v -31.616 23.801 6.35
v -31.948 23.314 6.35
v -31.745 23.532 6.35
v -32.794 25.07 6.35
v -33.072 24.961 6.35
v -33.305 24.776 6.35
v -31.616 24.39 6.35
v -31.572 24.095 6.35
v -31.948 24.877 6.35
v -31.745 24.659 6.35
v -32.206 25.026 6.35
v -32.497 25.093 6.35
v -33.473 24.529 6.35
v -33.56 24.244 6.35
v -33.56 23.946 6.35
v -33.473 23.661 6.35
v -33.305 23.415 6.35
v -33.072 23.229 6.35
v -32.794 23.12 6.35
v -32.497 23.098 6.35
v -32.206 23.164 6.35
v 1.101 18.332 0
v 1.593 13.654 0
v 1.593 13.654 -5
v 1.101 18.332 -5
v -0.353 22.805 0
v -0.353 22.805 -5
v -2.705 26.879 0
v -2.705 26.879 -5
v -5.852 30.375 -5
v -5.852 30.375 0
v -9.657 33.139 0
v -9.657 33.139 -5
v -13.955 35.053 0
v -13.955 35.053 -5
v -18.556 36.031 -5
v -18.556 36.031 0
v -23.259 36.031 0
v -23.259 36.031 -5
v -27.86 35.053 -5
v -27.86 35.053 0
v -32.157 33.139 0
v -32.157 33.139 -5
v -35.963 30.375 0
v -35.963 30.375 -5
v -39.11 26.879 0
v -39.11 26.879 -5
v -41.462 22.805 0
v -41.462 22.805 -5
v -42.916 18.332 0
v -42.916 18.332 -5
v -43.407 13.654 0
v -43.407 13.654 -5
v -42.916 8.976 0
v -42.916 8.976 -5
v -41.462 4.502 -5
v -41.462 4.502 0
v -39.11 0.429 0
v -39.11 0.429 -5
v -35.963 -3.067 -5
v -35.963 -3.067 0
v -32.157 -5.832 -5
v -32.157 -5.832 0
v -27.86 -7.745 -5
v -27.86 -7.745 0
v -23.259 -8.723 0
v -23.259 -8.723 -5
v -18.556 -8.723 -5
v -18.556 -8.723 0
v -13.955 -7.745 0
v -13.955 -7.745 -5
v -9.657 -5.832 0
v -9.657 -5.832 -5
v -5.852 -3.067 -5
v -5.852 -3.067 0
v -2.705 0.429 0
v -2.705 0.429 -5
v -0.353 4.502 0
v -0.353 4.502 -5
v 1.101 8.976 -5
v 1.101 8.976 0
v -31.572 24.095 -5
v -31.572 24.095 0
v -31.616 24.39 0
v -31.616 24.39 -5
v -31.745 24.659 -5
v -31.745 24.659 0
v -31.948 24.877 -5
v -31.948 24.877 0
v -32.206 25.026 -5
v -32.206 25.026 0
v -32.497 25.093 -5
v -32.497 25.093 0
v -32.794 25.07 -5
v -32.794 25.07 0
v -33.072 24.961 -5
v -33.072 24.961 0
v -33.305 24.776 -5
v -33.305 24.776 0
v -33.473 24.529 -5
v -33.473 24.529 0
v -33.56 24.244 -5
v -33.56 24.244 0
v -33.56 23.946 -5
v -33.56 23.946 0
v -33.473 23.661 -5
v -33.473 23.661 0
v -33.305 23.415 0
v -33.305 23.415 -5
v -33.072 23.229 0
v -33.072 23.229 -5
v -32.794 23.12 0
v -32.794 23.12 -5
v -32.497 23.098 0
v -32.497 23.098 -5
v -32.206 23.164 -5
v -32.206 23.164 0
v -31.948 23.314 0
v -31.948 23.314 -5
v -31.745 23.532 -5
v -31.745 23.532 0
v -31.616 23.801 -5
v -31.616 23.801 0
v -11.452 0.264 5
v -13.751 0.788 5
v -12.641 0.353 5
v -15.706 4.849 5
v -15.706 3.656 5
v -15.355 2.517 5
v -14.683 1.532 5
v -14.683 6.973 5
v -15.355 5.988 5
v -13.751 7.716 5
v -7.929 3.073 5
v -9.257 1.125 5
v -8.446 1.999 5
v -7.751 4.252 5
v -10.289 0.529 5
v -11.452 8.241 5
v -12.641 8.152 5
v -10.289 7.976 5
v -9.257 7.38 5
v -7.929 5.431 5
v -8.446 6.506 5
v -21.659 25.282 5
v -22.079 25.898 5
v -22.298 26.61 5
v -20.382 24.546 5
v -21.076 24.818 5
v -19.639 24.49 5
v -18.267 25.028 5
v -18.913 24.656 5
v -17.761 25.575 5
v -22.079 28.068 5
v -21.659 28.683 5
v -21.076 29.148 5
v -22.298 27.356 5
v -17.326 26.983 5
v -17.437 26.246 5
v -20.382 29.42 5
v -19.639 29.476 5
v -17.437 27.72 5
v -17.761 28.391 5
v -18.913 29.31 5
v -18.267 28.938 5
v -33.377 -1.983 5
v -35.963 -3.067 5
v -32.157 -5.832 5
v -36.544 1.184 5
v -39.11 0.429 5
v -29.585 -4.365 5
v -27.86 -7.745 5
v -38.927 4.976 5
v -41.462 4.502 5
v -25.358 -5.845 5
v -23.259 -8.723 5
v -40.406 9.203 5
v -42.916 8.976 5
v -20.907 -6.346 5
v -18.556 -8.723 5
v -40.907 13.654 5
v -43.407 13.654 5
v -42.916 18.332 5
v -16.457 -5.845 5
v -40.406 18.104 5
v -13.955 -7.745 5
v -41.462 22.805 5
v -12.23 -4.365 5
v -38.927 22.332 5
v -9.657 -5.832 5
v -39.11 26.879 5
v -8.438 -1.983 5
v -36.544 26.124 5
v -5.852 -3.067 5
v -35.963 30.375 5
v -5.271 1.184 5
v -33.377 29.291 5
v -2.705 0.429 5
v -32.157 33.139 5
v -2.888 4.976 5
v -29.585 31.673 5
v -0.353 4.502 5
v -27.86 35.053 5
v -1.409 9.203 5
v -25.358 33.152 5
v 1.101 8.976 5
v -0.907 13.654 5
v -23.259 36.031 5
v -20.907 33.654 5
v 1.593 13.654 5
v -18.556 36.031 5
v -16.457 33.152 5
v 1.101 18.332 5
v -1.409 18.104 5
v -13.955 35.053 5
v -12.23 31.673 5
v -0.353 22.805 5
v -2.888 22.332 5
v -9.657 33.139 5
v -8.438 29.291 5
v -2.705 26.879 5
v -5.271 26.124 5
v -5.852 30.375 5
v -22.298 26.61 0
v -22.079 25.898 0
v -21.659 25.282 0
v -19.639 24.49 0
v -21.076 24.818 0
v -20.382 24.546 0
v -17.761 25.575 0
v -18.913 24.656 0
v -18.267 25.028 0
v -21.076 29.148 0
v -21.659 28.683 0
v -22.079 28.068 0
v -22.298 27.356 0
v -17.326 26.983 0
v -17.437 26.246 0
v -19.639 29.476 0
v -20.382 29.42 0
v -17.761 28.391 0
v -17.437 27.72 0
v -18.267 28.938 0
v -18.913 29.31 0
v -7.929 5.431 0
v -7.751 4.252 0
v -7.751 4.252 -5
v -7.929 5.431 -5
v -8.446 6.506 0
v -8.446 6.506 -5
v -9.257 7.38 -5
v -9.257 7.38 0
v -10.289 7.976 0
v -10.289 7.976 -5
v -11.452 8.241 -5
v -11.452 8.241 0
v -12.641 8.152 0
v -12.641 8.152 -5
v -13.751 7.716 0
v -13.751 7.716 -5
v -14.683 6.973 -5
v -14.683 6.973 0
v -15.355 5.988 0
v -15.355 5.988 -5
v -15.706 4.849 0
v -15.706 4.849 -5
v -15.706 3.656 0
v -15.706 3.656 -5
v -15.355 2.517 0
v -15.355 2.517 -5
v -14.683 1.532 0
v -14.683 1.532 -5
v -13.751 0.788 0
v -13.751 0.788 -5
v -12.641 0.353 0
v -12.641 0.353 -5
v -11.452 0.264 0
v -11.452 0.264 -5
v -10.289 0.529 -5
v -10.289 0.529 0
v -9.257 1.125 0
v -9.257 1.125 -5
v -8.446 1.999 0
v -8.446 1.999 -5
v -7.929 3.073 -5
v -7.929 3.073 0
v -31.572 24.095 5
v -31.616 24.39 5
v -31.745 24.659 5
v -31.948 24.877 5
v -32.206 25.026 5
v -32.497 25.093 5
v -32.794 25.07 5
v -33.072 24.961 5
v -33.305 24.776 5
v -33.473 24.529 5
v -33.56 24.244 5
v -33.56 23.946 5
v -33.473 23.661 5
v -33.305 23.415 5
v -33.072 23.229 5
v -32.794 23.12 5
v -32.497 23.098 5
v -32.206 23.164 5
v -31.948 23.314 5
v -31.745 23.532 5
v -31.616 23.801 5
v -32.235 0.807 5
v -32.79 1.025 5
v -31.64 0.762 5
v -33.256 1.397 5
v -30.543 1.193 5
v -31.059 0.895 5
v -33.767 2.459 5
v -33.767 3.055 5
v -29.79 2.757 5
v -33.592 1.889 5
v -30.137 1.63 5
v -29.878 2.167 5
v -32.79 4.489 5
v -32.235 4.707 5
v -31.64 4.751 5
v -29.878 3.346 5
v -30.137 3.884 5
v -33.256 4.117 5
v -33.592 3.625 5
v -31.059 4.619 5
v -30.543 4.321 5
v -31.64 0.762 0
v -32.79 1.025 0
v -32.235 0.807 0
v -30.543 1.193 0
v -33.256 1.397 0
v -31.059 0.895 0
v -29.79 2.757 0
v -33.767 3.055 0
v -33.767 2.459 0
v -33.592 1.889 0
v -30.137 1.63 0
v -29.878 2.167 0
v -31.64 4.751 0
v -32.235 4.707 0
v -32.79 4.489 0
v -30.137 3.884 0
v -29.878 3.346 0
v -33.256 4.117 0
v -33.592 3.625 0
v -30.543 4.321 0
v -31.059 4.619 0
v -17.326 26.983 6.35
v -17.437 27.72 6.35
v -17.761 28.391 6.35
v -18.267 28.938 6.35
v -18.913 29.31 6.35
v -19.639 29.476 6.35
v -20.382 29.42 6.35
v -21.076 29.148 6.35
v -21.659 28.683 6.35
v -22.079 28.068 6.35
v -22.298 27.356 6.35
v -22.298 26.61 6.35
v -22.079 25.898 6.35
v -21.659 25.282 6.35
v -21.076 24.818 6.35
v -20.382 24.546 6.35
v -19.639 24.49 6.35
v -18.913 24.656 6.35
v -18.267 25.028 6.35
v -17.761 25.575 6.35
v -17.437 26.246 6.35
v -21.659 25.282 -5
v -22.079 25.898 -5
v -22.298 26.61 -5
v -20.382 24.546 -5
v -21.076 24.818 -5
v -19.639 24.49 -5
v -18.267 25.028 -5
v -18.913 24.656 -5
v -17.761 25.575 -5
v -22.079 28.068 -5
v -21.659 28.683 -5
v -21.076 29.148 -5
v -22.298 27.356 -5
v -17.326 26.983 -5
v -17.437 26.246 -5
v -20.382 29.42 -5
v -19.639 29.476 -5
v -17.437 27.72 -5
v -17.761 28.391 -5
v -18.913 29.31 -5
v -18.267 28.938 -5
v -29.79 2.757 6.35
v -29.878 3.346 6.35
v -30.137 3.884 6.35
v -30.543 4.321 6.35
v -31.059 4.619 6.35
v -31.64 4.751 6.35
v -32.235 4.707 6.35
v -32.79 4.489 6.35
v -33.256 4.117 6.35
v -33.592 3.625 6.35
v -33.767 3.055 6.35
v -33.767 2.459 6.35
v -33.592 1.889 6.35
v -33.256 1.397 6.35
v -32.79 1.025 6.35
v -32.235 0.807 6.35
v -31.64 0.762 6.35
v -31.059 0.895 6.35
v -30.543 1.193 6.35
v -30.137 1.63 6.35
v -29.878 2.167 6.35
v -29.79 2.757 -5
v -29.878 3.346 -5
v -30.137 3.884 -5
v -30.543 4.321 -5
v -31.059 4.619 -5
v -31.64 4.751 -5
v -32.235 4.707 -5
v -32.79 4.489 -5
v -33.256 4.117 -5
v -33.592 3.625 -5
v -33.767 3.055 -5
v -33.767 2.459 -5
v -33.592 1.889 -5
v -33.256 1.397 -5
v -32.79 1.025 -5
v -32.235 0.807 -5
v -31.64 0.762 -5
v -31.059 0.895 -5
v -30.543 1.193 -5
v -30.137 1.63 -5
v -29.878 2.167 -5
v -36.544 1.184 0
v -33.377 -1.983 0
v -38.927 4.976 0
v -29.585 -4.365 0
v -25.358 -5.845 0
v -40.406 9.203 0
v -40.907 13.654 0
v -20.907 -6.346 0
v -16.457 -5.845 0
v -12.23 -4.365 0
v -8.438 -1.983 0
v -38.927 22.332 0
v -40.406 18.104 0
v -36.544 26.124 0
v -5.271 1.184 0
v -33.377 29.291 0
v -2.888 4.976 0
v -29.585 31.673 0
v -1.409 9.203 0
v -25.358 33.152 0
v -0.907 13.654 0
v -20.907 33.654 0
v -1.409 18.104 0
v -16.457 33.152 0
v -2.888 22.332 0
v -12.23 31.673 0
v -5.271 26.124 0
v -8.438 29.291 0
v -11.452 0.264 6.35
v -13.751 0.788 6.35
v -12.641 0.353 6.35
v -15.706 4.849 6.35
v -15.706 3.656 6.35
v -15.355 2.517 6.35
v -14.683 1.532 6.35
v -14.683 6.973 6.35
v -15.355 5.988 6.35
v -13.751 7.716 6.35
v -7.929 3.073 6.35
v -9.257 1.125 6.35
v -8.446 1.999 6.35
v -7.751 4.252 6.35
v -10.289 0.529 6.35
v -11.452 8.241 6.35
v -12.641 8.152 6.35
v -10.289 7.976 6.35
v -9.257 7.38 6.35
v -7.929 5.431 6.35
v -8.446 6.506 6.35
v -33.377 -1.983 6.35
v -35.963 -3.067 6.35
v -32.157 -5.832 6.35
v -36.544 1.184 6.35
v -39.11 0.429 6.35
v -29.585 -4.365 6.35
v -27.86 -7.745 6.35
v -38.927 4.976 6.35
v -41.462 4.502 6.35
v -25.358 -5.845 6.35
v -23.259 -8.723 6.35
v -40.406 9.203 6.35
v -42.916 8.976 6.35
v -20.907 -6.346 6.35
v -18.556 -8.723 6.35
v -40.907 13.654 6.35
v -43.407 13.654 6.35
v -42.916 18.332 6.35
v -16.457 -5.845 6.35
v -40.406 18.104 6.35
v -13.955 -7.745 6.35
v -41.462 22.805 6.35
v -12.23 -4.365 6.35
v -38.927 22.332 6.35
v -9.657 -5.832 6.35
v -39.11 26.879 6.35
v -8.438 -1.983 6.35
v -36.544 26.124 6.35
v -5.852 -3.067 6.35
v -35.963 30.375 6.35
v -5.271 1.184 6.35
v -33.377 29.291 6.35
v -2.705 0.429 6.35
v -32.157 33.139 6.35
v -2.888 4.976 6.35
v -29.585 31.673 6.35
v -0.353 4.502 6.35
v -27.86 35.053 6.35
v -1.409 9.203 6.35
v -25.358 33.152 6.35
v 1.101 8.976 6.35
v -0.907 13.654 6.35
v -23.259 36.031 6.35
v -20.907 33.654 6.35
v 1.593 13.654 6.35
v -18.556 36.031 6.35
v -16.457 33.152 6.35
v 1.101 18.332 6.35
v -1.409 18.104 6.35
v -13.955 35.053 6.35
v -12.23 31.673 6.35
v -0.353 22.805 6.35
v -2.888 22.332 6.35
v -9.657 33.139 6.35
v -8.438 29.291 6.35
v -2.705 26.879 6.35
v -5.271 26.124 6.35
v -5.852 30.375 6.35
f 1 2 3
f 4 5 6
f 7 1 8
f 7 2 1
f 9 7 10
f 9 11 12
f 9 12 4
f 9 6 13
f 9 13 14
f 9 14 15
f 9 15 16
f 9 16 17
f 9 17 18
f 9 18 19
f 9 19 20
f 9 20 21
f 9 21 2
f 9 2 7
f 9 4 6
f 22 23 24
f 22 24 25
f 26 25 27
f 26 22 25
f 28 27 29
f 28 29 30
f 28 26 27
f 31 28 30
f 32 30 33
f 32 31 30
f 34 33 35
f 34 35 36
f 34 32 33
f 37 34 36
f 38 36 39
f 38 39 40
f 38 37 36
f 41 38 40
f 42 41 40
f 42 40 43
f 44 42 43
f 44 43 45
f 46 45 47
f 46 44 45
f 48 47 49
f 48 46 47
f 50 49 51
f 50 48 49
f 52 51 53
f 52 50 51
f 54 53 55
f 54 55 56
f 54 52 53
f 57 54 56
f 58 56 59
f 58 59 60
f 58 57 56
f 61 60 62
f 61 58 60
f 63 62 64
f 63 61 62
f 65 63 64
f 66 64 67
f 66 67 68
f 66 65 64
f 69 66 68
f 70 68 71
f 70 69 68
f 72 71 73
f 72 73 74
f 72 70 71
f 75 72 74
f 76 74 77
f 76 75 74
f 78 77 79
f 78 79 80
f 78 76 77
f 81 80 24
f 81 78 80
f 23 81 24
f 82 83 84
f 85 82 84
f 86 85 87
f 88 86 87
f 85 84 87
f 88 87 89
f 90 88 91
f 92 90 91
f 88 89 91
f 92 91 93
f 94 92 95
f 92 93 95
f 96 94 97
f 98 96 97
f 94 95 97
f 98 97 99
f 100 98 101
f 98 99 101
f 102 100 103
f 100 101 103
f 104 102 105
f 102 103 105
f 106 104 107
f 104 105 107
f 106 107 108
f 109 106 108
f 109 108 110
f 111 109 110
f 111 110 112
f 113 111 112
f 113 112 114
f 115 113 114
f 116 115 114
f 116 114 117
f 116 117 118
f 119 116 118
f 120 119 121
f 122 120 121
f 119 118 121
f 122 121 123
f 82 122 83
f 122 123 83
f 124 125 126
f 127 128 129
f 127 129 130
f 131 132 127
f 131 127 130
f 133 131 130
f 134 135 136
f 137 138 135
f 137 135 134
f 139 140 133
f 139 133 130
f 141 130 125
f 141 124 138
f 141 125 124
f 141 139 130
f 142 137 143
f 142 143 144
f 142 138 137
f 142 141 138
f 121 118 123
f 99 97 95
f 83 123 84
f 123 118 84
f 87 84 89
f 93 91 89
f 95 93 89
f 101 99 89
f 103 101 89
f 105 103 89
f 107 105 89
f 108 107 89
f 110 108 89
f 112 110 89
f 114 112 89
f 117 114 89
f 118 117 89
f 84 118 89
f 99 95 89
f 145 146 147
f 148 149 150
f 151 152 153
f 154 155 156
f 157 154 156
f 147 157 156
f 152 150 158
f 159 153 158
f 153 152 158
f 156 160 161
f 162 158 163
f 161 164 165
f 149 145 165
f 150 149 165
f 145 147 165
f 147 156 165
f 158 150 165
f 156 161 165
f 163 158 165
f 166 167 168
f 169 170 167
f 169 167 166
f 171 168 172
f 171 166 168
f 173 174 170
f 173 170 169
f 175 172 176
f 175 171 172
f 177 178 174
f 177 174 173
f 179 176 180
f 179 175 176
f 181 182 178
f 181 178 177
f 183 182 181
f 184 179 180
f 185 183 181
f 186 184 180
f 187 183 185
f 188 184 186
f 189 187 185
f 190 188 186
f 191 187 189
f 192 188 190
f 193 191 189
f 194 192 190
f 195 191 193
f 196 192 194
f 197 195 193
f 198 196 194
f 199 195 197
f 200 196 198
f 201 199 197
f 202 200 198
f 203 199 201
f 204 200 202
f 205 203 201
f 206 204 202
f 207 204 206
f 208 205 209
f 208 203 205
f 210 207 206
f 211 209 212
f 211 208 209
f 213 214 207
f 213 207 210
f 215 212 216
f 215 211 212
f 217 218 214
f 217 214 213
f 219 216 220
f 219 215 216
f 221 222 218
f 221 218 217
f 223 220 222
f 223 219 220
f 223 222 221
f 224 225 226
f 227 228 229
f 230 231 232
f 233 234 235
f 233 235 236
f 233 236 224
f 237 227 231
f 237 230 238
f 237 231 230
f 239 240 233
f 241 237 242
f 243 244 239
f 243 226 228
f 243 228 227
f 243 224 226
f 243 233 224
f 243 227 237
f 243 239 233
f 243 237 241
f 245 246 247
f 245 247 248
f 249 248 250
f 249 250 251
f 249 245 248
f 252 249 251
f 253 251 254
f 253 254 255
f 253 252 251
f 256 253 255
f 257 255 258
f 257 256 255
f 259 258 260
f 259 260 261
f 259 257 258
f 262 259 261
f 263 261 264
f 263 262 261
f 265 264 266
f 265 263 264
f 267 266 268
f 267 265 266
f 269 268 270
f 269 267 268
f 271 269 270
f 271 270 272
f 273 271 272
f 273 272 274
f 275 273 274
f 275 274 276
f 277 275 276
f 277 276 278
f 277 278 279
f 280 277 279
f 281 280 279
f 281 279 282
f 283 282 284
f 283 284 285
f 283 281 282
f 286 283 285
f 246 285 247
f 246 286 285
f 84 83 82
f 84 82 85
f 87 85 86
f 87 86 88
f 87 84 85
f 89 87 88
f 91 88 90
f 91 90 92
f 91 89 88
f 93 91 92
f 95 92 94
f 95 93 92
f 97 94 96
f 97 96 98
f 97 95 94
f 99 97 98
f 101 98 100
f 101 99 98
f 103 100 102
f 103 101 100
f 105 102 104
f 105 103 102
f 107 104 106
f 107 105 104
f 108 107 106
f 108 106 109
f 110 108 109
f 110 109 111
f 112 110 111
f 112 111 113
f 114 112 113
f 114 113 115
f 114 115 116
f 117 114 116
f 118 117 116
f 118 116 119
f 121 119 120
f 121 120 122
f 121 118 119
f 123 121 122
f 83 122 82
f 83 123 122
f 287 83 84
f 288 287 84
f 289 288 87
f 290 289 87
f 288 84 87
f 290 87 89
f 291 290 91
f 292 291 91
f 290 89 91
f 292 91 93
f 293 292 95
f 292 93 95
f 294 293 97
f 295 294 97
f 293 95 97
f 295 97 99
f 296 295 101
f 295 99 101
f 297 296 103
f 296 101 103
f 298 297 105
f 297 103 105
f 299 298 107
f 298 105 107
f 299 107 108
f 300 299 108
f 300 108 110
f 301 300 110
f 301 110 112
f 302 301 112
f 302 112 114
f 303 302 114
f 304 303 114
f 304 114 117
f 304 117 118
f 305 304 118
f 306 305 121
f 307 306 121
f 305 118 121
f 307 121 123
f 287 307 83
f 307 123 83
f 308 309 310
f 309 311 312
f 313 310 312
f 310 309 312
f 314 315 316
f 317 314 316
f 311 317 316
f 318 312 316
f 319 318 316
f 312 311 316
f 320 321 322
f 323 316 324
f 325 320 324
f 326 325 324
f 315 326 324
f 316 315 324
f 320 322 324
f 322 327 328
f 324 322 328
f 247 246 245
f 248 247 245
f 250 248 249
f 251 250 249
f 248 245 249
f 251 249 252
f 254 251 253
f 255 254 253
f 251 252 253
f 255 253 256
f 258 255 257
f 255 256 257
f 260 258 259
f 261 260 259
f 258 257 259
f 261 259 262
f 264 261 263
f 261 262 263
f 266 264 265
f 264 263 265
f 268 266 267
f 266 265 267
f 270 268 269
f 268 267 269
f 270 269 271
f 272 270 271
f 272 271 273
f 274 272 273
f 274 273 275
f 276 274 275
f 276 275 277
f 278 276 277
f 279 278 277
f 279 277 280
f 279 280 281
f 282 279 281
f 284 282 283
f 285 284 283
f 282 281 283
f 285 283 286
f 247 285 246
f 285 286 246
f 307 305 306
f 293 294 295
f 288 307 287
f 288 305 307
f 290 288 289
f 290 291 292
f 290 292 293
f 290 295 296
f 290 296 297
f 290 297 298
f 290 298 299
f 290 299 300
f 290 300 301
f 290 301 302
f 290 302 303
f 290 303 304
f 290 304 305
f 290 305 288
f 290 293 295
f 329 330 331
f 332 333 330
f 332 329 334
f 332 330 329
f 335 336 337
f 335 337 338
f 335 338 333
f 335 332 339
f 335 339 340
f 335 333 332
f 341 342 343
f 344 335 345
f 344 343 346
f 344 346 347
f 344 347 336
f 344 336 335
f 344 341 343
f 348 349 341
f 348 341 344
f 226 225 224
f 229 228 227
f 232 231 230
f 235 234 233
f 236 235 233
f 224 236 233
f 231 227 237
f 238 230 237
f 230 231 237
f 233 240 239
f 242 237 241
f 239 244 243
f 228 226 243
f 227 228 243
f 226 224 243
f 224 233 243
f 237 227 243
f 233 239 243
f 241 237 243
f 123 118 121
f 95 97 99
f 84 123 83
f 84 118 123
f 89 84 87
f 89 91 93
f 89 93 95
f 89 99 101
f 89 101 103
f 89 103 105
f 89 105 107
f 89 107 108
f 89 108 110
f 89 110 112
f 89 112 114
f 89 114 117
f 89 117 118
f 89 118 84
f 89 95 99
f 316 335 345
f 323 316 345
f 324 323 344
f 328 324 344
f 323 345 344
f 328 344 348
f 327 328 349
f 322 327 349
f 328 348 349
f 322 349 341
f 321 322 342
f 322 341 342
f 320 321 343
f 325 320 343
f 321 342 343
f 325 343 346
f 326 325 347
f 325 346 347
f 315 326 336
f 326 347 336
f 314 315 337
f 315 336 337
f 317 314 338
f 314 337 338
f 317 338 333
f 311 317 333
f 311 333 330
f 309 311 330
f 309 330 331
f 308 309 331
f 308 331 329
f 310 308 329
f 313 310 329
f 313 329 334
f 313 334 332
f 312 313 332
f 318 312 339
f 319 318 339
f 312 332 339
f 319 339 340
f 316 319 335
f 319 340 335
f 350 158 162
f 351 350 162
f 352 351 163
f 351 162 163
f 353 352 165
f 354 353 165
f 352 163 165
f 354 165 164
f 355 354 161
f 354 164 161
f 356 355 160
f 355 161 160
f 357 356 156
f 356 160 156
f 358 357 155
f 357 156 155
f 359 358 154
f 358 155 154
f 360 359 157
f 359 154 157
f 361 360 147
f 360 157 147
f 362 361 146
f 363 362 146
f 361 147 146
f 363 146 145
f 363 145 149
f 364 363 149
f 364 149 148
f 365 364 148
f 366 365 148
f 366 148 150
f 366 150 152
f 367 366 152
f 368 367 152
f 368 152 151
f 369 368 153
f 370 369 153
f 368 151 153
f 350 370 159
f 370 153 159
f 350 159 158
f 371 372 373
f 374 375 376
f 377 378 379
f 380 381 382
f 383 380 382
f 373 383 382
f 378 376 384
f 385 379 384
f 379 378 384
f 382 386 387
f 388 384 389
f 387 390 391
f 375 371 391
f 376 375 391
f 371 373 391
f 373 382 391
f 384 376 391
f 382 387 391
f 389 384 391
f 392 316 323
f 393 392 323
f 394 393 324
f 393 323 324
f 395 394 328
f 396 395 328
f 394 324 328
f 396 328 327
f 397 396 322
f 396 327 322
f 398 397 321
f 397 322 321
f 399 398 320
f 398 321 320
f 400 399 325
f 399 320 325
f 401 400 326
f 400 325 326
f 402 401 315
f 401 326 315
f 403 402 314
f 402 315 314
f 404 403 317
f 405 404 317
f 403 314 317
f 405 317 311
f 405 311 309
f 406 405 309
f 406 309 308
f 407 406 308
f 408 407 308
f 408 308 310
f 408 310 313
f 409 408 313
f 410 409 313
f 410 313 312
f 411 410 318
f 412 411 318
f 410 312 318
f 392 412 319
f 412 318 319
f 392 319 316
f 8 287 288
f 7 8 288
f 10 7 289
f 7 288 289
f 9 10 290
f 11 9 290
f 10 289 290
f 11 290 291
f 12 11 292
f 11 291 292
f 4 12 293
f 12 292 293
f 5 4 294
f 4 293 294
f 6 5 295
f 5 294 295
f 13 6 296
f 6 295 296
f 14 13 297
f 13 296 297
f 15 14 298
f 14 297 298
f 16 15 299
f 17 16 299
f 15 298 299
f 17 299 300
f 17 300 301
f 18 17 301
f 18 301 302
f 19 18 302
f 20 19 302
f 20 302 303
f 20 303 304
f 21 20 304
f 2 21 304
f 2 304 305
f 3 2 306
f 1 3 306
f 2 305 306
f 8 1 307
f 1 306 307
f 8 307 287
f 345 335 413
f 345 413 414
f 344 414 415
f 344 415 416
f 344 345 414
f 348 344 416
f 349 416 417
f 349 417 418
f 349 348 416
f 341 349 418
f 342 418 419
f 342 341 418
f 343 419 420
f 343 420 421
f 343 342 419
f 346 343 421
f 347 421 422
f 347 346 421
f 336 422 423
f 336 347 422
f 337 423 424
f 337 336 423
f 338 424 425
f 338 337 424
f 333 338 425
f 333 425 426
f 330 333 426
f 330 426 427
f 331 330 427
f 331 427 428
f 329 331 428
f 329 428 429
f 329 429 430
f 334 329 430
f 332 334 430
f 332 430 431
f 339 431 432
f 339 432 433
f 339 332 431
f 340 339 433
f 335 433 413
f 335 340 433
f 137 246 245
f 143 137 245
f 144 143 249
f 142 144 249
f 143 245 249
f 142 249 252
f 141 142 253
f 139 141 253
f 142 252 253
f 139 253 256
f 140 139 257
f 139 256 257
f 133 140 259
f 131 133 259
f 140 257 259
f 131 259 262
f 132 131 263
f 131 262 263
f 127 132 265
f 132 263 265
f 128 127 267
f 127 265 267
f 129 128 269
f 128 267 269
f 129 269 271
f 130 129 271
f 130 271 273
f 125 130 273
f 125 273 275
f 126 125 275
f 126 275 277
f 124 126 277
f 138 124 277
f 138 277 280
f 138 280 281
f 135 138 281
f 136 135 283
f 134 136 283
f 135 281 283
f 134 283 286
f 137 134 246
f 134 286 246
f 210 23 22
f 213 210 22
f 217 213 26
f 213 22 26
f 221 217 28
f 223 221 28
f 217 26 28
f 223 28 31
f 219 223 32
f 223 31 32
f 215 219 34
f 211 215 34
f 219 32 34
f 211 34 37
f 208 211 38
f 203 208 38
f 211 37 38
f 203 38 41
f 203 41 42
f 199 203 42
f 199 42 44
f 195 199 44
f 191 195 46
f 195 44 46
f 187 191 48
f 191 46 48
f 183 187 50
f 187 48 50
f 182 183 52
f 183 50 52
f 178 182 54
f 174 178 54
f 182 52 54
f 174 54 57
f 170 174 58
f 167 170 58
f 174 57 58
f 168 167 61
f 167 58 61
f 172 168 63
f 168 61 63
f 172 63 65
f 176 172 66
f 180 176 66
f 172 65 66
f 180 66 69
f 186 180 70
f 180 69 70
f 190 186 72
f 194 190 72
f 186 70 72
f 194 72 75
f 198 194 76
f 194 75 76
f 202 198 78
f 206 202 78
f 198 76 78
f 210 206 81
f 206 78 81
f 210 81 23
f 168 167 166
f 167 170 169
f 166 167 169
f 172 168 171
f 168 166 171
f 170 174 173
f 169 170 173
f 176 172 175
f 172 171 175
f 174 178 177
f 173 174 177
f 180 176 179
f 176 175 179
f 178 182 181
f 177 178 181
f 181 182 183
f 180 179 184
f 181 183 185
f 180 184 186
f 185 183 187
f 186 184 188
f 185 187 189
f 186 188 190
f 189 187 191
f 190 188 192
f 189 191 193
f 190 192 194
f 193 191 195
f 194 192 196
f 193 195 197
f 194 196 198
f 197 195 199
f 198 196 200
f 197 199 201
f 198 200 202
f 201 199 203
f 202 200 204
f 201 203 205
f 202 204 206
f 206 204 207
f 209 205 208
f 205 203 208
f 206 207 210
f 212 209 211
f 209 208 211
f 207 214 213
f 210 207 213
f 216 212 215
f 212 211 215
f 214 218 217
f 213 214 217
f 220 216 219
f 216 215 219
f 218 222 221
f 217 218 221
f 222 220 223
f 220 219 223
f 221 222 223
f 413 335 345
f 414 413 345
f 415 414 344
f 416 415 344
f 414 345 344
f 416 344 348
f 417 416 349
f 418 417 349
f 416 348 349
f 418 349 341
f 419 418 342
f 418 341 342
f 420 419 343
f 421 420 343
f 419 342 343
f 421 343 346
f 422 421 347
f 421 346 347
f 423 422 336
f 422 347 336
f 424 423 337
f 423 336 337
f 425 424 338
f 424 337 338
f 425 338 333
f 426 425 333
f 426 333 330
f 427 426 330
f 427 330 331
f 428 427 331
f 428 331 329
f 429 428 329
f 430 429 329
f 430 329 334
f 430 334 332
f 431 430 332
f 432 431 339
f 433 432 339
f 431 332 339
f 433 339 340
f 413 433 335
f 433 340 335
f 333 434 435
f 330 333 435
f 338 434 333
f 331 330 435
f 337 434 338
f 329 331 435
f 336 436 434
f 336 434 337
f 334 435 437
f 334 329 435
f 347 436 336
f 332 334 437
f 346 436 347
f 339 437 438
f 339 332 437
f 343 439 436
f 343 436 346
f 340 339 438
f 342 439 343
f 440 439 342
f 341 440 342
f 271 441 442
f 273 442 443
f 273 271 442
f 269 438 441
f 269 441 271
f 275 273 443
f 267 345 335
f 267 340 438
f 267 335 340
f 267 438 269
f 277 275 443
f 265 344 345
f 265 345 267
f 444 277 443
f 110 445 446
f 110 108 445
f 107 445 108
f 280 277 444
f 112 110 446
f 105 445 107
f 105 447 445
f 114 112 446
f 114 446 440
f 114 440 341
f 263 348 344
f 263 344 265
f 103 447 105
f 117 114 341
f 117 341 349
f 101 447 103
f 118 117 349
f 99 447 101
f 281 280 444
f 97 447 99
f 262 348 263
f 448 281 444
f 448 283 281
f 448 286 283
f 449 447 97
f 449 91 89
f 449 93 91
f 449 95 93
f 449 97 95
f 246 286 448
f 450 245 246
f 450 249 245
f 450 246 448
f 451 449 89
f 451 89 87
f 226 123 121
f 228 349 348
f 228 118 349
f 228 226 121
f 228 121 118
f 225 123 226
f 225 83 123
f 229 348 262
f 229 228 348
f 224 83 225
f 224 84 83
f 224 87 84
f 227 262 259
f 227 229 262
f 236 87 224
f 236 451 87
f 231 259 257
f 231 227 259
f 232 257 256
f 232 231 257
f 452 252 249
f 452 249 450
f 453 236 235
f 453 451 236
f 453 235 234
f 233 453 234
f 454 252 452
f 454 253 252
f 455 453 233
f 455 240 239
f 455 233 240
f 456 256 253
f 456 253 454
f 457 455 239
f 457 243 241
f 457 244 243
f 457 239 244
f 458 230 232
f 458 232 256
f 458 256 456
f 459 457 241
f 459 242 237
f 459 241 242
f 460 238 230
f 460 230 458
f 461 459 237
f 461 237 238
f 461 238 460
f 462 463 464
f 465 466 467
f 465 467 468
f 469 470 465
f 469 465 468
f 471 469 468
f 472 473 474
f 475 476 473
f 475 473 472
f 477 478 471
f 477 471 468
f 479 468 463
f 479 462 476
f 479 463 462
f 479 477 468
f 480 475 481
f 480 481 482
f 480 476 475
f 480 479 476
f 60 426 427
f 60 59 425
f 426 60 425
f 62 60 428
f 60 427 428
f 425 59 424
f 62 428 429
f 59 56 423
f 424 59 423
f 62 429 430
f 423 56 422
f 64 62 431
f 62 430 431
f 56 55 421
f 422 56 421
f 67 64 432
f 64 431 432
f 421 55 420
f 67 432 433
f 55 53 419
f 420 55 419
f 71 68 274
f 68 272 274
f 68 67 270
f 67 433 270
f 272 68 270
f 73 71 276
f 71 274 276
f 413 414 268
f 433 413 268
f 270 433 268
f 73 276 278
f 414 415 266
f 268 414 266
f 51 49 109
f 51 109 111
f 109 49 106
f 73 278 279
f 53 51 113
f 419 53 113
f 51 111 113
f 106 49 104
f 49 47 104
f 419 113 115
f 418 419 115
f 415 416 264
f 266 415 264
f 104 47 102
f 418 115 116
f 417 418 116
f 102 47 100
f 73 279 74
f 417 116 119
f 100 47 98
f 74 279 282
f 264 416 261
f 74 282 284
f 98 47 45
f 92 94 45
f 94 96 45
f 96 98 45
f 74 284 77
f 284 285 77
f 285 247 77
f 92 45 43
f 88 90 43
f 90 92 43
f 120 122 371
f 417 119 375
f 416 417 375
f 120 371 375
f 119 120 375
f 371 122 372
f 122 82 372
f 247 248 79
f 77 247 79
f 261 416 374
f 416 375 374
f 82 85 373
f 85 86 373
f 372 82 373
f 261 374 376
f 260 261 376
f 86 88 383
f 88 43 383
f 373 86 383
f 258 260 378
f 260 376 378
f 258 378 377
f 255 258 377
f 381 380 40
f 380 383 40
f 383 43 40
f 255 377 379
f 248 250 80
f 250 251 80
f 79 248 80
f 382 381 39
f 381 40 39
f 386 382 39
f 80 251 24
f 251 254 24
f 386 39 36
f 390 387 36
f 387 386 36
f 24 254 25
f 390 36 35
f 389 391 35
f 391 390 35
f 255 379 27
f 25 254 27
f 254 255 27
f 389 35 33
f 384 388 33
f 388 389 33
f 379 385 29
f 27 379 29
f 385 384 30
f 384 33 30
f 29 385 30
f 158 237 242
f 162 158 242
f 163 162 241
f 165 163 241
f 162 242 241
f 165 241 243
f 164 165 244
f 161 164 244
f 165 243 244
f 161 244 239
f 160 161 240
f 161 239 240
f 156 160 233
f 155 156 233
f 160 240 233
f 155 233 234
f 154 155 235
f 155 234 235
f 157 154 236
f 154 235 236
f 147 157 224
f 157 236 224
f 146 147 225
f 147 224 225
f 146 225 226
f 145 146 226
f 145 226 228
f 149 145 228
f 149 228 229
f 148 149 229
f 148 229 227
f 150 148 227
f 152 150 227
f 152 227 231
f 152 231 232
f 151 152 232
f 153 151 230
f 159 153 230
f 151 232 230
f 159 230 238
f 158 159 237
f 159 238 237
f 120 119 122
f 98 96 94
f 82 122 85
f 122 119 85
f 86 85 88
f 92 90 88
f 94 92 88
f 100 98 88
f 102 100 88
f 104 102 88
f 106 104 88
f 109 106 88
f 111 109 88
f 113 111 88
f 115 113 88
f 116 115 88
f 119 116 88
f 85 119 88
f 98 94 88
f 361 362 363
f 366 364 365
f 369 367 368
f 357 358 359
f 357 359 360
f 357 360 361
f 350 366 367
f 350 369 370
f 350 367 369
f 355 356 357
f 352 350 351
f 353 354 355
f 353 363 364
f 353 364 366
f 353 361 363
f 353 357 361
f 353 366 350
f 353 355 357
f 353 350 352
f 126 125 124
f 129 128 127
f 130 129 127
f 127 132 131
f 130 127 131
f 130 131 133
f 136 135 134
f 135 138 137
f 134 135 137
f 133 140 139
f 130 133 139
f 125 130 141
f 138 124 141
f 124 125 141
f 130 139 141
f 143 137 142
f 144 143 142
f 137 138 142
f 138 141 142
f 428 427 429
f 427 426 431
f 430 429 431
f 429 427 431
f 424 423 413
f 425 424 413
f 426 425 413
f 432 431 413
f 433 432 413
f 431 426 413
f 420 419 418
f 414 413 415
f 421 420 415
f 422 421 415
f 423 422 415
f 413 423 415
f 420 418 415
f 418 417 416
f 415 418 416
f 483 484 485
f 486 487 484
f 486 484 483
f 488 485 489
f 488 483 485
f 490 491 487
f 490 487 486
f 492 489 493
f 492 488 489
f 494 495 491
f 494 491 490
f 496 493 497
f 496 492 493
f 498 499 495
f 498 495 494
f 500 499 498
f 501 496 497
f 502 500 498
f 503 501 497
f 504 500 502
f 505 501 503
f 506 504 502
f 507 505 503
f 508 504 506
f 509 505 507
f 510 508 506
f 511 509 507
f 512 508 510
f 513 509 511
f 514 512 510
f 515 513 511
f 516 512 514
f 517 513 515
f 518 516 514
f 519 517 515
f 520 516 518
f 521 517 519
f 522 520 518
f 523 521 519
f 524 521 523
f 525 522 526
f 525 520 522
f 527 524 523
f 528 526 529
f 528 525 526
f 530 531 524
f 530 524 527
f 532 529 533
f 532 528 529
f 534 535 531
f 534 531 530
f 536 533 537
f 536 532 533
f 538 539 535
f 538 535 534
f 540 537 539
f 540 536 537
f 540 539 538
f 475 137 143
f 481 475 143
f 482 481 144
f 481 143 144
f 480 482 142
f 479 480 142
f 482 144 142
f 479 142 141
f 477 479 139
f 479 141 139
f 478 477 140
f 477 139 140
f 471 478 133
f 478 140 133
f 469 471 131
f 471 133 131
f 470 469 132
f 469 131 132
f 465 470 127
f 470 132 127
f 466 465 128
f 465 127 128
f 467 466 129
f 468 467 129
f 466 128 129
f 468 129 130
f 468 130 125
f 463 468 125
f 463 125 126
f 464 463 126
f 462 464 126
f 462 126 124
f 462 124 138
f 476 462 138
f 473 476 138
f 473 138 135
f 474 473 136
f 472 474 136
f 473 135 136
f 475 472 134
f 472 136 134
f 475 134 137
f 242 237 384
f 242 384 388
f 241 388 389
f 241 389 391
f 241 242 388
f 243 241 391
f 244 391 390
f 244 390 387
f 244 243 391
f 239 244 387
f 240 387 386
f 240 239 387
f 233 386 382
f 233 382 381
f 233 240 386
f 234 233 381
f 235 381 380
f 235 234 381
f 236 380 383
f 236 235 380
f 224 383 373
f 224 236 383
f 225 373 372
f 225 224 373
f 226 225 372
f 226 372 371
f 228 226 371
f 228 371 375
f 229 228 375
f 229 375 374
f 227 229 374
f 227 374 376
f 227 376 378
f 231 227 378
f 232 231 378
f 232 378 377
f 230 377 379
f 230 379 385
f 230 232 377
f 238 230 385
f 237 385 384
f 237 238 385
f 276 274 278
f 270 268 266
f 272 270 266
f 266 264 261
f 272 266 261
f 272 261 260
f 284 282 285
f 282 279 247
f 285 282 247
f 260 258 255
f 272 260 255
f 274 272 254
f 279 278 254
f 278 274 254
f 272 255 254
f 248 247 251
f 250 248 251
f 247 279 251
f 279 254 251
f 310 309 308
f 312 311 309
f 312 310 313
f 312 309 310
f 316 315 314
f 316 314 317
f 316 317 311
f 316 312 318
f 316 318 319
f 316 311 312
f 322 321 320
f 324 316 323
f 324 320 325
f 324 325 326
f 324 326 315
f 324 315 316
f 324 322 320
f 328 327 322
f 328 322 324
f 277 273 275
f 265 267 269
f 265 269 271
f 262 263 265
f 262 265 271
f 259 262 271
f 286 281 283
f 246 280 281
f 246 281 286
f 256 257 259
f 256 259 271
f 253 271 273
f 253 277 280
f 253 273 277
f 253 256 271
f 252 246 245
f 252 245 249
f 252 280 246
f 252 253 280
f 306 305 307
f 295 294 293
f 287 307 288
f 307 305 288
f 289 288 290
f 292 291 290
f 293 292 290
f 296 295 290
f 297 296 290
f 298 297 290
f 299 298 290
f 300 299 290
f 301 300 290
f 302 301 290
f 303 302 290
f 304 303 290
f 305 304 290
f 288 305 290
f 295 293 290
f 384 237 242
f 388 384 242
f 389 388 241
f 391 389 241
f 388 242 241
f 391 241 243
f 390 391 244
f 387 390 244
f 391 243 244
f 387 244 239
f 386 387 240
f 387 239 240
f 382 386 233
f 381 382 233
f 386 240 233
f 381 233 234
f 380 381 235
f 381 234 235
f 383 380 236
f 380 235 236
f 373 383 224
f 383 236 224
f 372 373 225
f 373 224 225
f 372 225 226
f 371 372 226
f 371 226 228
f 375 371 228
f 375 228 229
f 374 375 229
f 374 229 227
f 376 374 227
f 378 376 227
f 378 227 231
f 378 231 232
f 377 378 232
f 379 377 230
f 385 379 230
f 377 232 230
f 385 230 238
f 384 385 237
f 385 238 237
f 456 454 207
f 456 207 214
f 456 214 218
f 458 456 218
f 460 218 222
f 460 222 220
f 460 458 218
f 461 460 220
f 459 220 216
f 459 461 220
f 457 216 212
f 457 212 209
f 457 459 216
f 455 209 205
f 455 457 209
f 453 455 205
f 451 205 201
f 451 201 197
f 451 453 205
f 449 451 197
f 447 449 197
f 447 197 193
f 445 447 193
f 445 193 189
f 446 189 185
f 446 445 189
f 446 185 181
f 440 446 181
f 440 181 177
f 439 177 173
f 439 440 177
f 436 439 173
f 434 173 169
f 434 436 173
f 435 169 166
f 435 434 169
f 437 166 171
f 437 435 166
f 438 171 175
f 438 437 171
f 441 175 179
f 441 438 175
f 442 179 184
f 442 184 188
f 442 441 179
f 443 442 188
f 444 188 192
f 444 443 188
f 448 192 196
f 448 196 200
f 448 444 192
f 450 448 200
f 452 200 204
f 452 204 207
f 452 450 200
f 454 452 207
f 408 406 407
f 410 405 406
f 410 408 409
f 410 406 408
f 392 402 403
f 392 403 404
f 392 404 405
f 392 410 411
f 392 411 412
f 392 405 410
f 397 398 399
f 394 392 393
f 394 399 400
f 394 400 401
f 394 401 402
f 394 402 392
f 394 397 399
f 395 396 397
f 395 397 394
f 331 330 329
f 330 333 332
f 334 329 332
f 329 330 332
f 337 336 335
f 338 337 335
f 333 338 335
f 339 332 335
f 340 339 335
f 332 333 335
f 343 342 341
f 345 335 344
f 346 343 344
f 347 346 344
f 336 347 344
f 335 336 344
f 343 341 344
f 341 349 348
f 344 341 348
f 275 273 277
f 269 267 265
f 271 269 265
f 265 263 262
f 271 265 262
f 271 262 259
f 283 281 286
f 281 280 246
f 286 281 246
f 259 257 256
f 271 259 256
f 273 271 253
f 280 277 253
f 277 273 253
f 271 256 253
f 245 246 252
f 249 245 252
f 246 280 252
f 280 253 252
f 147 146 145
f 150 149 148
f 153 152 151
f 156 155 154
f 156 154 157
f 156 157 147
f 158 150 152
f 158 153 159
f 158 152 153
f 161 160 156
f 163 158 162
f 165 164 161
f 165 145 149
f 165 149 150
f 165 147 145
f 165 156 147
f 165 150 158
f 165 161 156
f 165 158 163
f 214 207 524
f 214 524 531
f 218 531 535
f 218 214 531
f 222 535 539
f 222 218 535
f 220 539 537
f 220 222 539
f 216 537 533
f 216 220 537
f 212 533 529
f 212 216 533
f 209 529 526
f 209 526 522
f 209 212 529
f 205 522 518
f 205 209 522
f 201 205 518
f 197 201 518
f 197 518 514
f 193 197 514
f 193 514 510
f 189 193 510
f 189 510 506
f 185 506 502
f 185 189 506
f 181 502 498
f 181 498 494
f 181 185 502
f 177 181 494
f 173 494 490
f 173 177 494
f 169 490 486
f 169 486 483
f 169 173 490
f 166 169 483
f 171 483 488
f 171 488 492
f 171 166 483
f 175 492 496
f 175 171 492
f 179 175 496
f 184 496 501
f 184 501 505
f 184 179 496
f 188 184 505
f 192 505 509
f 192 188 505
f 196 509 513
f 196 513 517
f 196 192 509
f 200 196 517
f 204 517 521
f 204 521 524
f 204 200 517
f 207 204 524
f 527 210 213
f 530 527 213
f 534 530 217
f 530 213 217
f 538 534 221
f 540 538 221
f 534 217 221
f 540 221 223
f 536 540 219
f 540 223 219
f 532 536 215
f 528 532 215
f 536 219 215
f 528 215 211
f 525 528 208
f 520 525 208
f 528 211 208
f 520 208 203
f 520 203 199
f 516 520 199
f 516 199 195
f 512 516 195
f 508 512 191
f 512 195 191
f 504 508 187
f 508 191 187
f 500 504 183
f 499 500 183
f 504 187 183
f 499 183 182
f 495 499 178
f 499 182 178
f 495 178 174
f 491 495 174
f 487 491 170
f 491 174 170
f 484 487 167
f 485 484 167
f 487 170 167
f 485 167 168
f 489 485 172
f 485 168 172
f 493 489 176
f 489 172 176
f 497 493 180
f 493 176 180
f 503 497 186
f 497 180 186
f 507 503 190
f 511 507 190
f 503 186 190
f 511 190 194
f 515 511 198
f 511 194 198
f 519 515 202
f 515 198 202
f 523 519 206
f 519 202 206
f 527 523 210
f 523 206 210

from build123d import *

# Parameters (mm, degrees)
F0_R        = 22.5
F0_R_2      = 20
F1_DEPTH    = 5
F0_R_3      = 4
F0_R_4      = 2.5
F0_R_5      = 1
F0_R_6      = 2
F1_FACE_R   = 22.5
F1_FACE_R_2 = 20
F2_DEPTH    = 5
F5_DEPTH    = 5
F6_DEPTH    = 1.35


# Not quite as in the source:
# - a feature of the source that left no trace in its solid (it failed there, or was rolled back) is left out
# - the program builds the solid bodies; features that only make, move or delete a surface that nothing else refers to are left out


with BuildPart() as f1:
    # F0 (on Top) → F1 (new body)
    with BuildSketch(Plane.XY):
        with Locations((-20.9074081164, 13.653905517)):
            Circle(F0_R)
        with Locations((-20.9074081164, 13.653905517)):
            Circle(F0_R_2, mode=Mode.SUBTRACT)
    extrude(amount=F1_DEPTH)

    # F1_face (on face) + F0 (on Top) → F2 (join)
    with BuildSketch(Plane(origin=(-20.9074081164, 13.653905517, 5), x_dir=(1, 0, 0), z_dir=(0, 0, 1))):
        Circle(F1_FACE_R)
        Circle(F1_FACE_R_2, mode=Mode.SUBTRACT)
    with BuildSketch(Plane.XY):
        with Locations((-20.9074081164, 13.653905517)):
            Circle(F0_R)
        with Locations((-20.9074081164, 13.653905517)):
            Circle(F0_R_2, mode=Mode.SUBTRACT)
        with Locations((-20.9074081164, 13.653905517)):
            Circle(F0_R_2)
        with Locations((-31.7896045744, 2.7569008525)):
            Circle(F0_R_6, mode=Mode.SUBTRACT)
        with Locations((-11.7507977411, 4.2523336597)):
            Circle(F0_R_3, mode=Mode.SUBTRACT)
        with Locations((-32.5716212392, 24.0953601897)):
            Circle(F0_R_5, mode=Mode.SUBTRACT)
        with Locations((-19.8261346668, 26.982922107)):
            Circle(F0_R_4, mode=Mode.SUBTRACT)
    extrude(amount=-F2_DEPTH)


with BuildPart() as f1b:
    # F0 (on Top) → F1, piece 2 (new body)
    with BuildSketch(Plane.XY):
        with Locations((-11.7507977411, 4.2523336597)):
            Circle(F0_R_3)
    extrude(amount=F1_DEPTH)


with BuildPart() as f1c:
    # F0 (on Top) → F1, piece 3 (new body)
    with BuildSketch(Plane.XY):
        with Locations((-19.8261346668, 26.982922107)):
            Circle(F0_R_4)
    extrude(amount=F1_DEPTH)


with BuildPart() as f1d:
    # F0 (on Top) → F1, piece 4 (new body)
    with BuildSketch(Plane.XY):
        with Locations((-32.5716212392, 24.0953601897)):
            Circle(F0_R_5)
    extrude(amount=F1_DEPTH)


with BuildPart() as f1e:
    # F0 (on Top) → F1, piece 5 (new body)
    with BuildSketch(Plane.XY):
        with Locations((-31.7896045744, 2.7569008525)):
            Circle(F0_R_6)
    extrude(amount=F1_DEPTH)


with BuildPart() as f5:
    # F0 (on Top) → F5 (new body)
    with BuildSketch(Plane.XY):
        with Locations((-11.7507977411, 4.2523336597)):
            Circle(F0_R_3)
    extrude(amount=-F5_DEPTH)


with BuildPart() as f5b:
    # F0 (on Top) → F5, piece 2 (new body)
    with BuildSketch(Plane.XY):
        with Locations((-31.7896045744, 2.7569008525)):
            Circle(F0_R_6)
    extrude(amount=-F5_DEPTH)


with BuildPart() as f5c:
    # F0 (on Top) → F5, piece 3 (new body)
    with BuildSketch(Plane.XY):
        with Locations((-32.5716212392, 24.0953601897)):
            Circle(F0_R_5)
    extrude(amount=-F5_DEPTH)


with BuildPart() as f5d:
    # F0 (on Top) → F5, piece 4 (new body)
    with BuildSketch(Plane.XY):
        with Locations((-19.8261346668, 26.982922107)):
            Circle(F0_R_4)
    extrude(amount=-F5_DEPTH)


with BuildPart() as f6:
    # F6 (new): a face of the model
    f6_faces = [f1.part.faces().sort_by_distance(p)[0] for p in [
        (-42.7710120133, 13.653905517, 5),
    ]]
    extrude(f6_faces, amount=F6_DEPTH)


with BuildPart() as f6b:
    # F6#2 (new): a face of the model
    f6_2_faces = [f1e.part.faces().sort_by_distance(p)[0] for p in [
        (-31.7896045744, 2.7569008525, 5),
    ]]
    extrude(f6_2_faces, amount=F6_DEPTH)


with BuildPart() as f6c:
    # F6#3 (new): a face of the model
    f6_3_faces = [f1d.part.faces().sort_by_distance(p)[0] for p in [
        (-32.5716212392, 24.0953601897, 5),
    ]]
    extrude(f6_3_faces, amount=F6_DEPTH)


with BuildPart() as f6d:
    # F6#4 (new): a face of the model
    f6_4_faces = [f1b.part.faces().sort_by_distance(p)[0] for p in [
        (-11.7507977411, 4.2523336597, 5),
    ]]
    extrude(f6_4_faces, amount=F6_DEPTH)


with BuildPart() as f6e:
    # F6#5 (new): a face of the model
    f6_5_faces = [f1c.part.faces().sort_by_distance(p)[0] for p in [
        (-19.8261346668, 26.982922107, 5),
    ]]
    extrude(f6_5_faces, amount=F6_DEPTH)


solid = Compound([f1.part, f1b.part, f1c.part, f1d.part, f1e.part, f5.part, f5b.part, f5c.part, f5d.part, f6.part, f6b.part, f6c.part, f6d.part, f6e.part])
